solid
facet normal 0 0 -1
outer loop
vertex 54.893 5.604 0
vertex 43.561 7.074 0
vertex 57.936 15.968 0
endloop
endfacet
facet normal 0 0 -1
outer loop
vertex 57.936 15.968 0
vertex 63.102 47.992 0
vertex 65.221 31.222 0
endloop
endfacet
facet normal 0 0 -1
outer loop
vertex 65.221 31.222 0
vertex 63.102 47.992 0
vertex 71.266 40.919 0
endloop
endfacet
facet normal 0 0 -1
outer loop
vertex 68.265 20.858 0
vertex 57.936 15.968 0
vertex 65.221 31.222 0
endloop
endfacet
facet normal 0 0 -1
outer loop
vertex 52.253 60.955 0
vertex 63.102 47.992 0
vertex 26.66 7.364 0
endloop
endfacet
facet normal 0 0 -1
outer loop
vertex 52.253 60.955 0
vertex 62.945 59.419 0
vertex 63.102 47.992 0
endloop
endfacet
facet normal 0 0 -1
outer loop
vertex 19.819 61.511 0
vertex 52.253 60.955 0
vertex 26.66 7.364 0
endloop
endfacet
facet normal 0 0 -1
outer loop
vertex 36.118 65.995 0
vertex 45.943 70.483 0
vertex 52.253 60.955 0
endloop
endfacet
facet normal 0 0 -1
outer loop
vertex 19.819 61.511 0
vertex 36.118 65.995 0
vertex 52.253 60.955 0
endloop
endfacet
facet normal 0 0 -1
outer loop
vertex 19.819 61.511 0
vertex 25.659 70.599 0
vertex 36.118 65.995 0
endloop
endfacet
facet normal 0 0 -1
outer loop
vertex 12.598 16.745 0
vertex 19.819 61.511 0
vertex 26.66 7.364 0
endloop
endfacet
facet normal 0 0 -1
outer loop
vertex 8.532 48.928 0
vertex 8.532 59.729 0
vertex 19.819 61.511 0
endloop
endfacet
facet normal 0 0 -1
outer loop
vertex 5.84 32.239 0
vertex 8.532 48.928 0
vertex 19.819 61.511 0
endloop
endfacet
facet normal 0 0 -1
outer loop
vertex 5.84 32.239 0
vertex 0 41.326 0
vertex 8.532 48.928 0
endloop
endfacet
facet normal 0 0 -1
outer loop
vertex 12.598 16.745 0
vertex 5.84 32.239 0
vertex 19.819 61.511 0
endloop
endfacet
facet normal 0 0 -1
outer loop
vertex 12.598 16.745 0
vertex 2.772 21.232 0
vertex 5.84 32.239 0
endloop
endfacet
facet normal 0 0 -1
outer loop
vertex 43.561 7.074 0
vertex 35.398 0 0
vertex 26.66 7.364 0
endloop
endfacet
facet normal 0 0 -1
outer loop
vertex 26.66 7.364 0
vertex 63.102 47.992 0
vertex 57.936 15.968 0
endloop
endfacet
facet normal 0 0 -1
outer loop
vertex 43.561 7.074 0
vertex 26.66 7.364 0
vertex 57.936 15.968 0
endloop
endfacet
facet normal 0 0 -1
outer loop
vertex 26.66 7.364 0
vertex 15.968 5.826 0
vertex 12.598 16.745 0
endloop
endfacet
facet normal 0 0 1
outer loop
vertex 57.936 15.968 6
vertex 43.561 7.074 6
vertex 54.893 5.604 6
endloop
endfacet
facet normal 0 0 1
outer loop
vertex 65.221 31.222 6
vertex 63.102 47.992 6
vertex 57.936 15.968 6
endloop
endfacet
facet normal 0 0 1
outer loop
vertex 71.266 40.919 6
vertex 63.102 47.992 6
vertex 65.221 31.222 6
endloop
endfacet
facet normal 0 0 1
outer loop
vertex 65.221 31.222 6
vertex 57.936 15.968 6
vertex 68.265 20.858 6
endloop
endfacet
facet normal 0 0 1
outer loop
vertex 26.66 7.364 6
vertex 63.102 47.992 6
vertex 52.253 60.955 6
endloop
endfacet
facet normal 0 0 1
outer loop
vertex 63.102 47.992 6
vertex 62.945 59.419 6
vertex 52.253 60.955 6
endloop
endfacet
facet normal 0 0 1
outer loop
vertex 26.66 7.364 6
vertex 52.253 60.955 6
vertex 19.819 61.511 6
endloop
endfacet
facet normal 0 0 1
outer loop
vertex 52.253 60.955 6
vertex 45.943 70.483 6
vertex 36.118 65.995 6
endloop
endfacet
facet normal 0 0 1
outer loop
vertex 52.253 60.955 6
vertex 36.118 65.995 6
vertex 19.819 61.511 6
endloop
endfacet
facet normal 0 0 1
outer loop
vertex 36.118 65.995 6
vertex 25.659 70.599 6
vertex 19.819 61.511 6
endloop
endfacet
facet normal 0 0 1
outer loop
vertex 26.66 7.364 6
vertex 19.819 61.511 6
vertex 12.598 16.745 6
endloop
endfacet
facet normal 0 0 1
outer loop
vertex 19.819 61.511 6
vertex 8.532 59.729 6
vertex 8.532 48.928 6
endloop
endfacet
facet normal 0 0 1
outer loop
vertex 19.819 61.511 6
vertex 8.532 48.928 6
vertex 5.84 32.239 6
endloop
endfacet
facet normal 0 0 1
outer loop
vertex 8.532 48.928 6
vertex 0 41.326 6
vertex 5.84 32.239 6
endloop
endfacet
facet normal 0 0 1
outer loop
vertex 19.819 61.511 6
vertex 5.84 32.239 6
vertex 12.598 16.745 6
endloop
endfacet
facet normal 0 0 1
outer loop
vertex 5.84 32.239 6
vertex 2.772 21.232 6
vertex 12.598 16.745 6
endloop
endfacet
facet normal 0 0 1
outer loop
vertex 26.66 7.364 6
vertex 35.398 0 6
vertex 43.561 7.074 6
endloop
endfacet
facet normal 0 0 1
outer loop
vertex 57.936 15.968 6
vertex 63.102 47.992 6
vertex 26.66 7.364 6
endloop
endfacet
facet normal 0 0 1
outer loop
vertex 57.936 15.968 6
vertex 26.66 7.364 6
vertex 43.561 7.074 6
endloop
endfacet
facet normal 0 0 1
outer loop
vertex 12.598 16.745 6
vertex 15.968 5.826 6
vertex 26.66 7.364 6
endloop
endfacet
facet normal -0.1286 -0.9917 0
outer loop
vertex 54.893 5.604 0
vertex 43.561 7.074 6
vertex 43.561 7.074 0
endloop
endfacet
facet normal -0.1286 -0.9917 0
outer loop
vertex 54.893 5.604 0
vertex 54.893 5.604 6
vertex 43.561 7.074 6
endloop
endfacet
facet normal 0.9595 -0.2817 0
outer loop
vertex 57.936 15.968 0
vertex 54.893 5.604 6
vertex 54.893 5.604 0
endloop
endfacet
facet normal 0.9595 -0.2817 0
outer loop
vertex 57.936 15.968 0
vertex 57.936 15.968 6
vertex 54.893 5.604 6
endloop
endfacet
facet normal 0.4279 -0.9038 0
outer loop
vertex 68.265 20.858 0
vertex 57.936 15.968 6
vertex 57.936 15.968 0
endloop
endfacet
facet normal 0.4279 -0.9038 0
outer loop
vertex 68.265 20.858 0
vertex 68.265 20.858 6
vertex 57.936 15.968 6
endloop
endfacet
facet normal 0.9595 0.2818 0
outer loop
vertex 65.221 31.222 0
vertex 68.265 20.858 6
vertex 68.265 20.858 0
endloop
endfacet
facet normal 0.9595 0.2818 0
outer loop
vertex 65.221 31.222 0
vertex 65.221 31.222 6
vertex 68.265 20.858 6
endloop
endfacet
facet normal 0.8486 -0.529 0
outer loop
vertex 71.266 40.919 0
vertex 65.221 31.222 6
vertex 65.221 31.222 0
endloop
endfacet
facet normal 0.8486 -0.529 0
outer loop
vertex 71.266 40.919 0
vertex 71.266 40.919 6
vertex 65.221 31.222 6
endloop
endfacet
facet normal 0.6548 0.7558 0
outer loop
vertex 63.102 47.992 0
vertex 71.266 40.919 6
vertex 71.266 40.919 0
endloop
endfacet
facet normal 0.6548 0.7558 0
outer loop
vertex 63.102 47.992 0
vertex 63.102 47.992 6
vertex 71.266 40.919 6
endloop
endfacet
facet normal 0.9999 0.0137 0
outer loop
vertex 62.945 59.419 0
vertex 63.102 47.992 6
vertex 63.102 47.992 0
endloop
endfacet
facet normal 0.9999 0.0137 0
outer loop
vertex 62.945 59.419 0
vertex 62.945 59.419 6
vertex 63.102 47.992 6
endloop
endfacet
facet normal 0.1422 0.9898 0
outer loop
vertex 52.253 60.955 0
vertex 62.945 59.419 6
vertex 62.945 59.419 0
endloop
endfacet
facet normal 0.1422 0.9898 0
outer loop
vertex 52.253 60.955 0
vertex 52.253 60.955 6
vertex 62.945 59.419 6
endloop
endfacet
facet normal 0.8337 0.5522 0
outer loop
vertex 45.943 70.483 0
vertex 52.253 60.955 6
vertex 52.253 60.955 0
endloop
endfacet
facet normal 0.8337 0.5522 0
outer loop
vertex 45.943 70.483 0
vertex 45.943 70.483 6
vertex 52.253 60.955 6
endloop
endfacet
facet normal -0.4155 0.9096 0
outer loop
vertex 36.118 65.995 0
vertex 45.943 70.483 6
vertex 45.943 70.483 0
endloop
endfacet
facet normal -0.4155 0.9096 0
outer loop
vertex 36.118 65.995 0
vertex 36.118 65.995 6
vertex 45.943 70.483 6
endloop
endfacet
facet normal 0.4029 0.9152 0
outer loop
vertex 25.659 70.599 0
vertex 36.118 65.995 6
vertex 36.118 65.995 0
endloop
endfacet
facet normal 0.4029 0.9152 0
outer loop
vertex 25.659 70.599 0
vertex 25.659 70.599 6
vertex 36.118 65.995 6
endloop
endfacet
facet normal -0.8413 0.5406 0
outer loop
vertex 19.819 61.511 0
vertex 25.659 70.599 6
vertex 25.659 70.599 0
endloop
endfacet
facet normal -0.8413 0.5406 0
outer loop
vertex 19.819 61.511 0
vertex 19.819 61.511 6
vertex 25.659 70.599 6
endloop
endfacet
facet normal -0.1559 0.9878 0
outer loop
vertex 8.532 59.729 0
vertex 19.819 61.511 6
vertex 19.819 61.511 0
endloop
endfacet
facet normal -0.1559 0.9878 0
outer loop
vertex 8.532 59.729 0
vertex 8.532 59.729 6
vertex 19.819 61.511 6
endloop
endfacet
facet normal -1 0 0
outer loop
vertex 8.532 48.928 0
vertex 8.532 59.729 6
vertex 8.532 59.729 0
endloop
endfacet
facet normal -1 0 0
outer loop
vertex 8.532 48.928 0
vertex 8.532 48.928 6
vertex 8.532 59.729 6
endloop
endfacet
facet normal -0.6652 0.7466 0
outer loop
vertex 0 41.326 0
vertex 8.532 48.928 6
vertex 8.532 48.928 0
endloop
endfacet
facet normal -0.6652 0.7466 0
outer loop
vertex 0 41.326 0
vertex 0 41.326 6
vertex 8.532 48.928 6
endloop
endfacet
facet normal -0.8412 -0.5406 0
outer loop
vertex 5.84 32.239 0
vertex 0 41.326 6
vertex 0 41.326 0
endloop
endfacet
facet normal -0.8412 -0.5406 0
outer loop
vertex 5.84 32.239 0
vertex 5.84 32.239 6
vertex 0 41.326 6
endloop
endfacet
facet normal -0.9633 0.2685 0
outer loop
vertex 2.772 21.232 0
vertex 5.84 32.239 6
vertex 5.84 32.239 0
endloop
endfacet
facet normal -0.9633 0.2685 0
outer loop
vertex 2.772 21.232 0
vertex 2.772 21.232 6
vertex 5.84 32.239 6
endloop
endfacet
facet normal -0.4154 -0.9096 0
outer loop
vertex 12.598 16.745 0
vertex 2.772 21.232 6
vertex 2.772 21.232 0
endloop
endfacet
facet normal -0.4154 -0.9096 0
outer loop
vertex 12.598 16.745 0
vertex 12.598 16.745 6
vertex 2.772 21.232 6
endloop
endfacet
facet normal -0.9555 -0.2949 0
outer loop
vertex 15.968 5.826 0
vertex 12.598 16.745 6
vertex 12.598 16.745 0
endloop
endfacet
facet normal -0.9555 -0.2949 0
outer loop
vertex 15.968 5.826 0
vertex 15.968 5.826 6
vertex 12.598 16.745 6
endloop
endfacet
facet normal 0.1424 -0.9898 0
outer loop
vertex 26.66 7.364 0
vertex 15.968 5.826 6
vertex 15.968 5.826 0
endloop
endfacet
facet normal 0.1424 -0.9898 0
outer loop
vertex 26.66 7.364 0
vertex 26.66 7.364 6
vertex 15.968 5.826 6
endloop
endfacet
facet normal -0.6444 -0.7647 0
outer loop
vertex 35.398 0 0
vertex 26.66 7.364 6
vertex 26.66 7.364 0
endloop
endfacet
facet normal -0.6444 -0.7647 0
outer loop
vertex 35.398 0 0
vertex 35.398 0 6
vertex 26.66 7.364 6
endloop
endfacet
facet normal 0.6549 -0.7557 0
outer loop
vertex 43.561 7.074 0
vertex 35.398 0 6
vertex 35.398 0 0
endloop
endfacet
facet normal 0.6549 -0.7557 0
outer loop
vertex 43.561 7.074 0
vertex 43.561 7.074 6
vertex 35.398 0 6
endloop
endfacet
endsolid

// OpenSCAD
$fn = 32;

// ----------------------------------------------------------------------
// Chain sprocket: 11 teeth, 30 mm root radius
// ----------------------------------------------------------------------

// --- parameters (mm) ---
profile_height = 6;       // extrusion height
profile_points = 22;      // points of the closed outline

profile = [[65.221, 31.222], [71.266, 40.919], [63.102, 47.992], [62.945, 59.419], [52.253, 60.955], [45.943, 70.483], [36.118, 65.995], [25.659, 70.599], [19.819, 61.511], [8.532, 59.729], [8.532, 48.928], [0, 41.326], [5.84, 32.239], [2.772, 21.232], [12.598, 16.745], [15.968, 5.826], [26.66, 7.364], [35.398, 0], [43.561, 7.074], [54.893, 5.604], [57.936, 15.968], [68.265, 20.858]];  // single closed polygon, 22 points, counter clockwise

// --- the one profile operation ---
linear_extrude(height = profile_height) polygon(points = profile);
